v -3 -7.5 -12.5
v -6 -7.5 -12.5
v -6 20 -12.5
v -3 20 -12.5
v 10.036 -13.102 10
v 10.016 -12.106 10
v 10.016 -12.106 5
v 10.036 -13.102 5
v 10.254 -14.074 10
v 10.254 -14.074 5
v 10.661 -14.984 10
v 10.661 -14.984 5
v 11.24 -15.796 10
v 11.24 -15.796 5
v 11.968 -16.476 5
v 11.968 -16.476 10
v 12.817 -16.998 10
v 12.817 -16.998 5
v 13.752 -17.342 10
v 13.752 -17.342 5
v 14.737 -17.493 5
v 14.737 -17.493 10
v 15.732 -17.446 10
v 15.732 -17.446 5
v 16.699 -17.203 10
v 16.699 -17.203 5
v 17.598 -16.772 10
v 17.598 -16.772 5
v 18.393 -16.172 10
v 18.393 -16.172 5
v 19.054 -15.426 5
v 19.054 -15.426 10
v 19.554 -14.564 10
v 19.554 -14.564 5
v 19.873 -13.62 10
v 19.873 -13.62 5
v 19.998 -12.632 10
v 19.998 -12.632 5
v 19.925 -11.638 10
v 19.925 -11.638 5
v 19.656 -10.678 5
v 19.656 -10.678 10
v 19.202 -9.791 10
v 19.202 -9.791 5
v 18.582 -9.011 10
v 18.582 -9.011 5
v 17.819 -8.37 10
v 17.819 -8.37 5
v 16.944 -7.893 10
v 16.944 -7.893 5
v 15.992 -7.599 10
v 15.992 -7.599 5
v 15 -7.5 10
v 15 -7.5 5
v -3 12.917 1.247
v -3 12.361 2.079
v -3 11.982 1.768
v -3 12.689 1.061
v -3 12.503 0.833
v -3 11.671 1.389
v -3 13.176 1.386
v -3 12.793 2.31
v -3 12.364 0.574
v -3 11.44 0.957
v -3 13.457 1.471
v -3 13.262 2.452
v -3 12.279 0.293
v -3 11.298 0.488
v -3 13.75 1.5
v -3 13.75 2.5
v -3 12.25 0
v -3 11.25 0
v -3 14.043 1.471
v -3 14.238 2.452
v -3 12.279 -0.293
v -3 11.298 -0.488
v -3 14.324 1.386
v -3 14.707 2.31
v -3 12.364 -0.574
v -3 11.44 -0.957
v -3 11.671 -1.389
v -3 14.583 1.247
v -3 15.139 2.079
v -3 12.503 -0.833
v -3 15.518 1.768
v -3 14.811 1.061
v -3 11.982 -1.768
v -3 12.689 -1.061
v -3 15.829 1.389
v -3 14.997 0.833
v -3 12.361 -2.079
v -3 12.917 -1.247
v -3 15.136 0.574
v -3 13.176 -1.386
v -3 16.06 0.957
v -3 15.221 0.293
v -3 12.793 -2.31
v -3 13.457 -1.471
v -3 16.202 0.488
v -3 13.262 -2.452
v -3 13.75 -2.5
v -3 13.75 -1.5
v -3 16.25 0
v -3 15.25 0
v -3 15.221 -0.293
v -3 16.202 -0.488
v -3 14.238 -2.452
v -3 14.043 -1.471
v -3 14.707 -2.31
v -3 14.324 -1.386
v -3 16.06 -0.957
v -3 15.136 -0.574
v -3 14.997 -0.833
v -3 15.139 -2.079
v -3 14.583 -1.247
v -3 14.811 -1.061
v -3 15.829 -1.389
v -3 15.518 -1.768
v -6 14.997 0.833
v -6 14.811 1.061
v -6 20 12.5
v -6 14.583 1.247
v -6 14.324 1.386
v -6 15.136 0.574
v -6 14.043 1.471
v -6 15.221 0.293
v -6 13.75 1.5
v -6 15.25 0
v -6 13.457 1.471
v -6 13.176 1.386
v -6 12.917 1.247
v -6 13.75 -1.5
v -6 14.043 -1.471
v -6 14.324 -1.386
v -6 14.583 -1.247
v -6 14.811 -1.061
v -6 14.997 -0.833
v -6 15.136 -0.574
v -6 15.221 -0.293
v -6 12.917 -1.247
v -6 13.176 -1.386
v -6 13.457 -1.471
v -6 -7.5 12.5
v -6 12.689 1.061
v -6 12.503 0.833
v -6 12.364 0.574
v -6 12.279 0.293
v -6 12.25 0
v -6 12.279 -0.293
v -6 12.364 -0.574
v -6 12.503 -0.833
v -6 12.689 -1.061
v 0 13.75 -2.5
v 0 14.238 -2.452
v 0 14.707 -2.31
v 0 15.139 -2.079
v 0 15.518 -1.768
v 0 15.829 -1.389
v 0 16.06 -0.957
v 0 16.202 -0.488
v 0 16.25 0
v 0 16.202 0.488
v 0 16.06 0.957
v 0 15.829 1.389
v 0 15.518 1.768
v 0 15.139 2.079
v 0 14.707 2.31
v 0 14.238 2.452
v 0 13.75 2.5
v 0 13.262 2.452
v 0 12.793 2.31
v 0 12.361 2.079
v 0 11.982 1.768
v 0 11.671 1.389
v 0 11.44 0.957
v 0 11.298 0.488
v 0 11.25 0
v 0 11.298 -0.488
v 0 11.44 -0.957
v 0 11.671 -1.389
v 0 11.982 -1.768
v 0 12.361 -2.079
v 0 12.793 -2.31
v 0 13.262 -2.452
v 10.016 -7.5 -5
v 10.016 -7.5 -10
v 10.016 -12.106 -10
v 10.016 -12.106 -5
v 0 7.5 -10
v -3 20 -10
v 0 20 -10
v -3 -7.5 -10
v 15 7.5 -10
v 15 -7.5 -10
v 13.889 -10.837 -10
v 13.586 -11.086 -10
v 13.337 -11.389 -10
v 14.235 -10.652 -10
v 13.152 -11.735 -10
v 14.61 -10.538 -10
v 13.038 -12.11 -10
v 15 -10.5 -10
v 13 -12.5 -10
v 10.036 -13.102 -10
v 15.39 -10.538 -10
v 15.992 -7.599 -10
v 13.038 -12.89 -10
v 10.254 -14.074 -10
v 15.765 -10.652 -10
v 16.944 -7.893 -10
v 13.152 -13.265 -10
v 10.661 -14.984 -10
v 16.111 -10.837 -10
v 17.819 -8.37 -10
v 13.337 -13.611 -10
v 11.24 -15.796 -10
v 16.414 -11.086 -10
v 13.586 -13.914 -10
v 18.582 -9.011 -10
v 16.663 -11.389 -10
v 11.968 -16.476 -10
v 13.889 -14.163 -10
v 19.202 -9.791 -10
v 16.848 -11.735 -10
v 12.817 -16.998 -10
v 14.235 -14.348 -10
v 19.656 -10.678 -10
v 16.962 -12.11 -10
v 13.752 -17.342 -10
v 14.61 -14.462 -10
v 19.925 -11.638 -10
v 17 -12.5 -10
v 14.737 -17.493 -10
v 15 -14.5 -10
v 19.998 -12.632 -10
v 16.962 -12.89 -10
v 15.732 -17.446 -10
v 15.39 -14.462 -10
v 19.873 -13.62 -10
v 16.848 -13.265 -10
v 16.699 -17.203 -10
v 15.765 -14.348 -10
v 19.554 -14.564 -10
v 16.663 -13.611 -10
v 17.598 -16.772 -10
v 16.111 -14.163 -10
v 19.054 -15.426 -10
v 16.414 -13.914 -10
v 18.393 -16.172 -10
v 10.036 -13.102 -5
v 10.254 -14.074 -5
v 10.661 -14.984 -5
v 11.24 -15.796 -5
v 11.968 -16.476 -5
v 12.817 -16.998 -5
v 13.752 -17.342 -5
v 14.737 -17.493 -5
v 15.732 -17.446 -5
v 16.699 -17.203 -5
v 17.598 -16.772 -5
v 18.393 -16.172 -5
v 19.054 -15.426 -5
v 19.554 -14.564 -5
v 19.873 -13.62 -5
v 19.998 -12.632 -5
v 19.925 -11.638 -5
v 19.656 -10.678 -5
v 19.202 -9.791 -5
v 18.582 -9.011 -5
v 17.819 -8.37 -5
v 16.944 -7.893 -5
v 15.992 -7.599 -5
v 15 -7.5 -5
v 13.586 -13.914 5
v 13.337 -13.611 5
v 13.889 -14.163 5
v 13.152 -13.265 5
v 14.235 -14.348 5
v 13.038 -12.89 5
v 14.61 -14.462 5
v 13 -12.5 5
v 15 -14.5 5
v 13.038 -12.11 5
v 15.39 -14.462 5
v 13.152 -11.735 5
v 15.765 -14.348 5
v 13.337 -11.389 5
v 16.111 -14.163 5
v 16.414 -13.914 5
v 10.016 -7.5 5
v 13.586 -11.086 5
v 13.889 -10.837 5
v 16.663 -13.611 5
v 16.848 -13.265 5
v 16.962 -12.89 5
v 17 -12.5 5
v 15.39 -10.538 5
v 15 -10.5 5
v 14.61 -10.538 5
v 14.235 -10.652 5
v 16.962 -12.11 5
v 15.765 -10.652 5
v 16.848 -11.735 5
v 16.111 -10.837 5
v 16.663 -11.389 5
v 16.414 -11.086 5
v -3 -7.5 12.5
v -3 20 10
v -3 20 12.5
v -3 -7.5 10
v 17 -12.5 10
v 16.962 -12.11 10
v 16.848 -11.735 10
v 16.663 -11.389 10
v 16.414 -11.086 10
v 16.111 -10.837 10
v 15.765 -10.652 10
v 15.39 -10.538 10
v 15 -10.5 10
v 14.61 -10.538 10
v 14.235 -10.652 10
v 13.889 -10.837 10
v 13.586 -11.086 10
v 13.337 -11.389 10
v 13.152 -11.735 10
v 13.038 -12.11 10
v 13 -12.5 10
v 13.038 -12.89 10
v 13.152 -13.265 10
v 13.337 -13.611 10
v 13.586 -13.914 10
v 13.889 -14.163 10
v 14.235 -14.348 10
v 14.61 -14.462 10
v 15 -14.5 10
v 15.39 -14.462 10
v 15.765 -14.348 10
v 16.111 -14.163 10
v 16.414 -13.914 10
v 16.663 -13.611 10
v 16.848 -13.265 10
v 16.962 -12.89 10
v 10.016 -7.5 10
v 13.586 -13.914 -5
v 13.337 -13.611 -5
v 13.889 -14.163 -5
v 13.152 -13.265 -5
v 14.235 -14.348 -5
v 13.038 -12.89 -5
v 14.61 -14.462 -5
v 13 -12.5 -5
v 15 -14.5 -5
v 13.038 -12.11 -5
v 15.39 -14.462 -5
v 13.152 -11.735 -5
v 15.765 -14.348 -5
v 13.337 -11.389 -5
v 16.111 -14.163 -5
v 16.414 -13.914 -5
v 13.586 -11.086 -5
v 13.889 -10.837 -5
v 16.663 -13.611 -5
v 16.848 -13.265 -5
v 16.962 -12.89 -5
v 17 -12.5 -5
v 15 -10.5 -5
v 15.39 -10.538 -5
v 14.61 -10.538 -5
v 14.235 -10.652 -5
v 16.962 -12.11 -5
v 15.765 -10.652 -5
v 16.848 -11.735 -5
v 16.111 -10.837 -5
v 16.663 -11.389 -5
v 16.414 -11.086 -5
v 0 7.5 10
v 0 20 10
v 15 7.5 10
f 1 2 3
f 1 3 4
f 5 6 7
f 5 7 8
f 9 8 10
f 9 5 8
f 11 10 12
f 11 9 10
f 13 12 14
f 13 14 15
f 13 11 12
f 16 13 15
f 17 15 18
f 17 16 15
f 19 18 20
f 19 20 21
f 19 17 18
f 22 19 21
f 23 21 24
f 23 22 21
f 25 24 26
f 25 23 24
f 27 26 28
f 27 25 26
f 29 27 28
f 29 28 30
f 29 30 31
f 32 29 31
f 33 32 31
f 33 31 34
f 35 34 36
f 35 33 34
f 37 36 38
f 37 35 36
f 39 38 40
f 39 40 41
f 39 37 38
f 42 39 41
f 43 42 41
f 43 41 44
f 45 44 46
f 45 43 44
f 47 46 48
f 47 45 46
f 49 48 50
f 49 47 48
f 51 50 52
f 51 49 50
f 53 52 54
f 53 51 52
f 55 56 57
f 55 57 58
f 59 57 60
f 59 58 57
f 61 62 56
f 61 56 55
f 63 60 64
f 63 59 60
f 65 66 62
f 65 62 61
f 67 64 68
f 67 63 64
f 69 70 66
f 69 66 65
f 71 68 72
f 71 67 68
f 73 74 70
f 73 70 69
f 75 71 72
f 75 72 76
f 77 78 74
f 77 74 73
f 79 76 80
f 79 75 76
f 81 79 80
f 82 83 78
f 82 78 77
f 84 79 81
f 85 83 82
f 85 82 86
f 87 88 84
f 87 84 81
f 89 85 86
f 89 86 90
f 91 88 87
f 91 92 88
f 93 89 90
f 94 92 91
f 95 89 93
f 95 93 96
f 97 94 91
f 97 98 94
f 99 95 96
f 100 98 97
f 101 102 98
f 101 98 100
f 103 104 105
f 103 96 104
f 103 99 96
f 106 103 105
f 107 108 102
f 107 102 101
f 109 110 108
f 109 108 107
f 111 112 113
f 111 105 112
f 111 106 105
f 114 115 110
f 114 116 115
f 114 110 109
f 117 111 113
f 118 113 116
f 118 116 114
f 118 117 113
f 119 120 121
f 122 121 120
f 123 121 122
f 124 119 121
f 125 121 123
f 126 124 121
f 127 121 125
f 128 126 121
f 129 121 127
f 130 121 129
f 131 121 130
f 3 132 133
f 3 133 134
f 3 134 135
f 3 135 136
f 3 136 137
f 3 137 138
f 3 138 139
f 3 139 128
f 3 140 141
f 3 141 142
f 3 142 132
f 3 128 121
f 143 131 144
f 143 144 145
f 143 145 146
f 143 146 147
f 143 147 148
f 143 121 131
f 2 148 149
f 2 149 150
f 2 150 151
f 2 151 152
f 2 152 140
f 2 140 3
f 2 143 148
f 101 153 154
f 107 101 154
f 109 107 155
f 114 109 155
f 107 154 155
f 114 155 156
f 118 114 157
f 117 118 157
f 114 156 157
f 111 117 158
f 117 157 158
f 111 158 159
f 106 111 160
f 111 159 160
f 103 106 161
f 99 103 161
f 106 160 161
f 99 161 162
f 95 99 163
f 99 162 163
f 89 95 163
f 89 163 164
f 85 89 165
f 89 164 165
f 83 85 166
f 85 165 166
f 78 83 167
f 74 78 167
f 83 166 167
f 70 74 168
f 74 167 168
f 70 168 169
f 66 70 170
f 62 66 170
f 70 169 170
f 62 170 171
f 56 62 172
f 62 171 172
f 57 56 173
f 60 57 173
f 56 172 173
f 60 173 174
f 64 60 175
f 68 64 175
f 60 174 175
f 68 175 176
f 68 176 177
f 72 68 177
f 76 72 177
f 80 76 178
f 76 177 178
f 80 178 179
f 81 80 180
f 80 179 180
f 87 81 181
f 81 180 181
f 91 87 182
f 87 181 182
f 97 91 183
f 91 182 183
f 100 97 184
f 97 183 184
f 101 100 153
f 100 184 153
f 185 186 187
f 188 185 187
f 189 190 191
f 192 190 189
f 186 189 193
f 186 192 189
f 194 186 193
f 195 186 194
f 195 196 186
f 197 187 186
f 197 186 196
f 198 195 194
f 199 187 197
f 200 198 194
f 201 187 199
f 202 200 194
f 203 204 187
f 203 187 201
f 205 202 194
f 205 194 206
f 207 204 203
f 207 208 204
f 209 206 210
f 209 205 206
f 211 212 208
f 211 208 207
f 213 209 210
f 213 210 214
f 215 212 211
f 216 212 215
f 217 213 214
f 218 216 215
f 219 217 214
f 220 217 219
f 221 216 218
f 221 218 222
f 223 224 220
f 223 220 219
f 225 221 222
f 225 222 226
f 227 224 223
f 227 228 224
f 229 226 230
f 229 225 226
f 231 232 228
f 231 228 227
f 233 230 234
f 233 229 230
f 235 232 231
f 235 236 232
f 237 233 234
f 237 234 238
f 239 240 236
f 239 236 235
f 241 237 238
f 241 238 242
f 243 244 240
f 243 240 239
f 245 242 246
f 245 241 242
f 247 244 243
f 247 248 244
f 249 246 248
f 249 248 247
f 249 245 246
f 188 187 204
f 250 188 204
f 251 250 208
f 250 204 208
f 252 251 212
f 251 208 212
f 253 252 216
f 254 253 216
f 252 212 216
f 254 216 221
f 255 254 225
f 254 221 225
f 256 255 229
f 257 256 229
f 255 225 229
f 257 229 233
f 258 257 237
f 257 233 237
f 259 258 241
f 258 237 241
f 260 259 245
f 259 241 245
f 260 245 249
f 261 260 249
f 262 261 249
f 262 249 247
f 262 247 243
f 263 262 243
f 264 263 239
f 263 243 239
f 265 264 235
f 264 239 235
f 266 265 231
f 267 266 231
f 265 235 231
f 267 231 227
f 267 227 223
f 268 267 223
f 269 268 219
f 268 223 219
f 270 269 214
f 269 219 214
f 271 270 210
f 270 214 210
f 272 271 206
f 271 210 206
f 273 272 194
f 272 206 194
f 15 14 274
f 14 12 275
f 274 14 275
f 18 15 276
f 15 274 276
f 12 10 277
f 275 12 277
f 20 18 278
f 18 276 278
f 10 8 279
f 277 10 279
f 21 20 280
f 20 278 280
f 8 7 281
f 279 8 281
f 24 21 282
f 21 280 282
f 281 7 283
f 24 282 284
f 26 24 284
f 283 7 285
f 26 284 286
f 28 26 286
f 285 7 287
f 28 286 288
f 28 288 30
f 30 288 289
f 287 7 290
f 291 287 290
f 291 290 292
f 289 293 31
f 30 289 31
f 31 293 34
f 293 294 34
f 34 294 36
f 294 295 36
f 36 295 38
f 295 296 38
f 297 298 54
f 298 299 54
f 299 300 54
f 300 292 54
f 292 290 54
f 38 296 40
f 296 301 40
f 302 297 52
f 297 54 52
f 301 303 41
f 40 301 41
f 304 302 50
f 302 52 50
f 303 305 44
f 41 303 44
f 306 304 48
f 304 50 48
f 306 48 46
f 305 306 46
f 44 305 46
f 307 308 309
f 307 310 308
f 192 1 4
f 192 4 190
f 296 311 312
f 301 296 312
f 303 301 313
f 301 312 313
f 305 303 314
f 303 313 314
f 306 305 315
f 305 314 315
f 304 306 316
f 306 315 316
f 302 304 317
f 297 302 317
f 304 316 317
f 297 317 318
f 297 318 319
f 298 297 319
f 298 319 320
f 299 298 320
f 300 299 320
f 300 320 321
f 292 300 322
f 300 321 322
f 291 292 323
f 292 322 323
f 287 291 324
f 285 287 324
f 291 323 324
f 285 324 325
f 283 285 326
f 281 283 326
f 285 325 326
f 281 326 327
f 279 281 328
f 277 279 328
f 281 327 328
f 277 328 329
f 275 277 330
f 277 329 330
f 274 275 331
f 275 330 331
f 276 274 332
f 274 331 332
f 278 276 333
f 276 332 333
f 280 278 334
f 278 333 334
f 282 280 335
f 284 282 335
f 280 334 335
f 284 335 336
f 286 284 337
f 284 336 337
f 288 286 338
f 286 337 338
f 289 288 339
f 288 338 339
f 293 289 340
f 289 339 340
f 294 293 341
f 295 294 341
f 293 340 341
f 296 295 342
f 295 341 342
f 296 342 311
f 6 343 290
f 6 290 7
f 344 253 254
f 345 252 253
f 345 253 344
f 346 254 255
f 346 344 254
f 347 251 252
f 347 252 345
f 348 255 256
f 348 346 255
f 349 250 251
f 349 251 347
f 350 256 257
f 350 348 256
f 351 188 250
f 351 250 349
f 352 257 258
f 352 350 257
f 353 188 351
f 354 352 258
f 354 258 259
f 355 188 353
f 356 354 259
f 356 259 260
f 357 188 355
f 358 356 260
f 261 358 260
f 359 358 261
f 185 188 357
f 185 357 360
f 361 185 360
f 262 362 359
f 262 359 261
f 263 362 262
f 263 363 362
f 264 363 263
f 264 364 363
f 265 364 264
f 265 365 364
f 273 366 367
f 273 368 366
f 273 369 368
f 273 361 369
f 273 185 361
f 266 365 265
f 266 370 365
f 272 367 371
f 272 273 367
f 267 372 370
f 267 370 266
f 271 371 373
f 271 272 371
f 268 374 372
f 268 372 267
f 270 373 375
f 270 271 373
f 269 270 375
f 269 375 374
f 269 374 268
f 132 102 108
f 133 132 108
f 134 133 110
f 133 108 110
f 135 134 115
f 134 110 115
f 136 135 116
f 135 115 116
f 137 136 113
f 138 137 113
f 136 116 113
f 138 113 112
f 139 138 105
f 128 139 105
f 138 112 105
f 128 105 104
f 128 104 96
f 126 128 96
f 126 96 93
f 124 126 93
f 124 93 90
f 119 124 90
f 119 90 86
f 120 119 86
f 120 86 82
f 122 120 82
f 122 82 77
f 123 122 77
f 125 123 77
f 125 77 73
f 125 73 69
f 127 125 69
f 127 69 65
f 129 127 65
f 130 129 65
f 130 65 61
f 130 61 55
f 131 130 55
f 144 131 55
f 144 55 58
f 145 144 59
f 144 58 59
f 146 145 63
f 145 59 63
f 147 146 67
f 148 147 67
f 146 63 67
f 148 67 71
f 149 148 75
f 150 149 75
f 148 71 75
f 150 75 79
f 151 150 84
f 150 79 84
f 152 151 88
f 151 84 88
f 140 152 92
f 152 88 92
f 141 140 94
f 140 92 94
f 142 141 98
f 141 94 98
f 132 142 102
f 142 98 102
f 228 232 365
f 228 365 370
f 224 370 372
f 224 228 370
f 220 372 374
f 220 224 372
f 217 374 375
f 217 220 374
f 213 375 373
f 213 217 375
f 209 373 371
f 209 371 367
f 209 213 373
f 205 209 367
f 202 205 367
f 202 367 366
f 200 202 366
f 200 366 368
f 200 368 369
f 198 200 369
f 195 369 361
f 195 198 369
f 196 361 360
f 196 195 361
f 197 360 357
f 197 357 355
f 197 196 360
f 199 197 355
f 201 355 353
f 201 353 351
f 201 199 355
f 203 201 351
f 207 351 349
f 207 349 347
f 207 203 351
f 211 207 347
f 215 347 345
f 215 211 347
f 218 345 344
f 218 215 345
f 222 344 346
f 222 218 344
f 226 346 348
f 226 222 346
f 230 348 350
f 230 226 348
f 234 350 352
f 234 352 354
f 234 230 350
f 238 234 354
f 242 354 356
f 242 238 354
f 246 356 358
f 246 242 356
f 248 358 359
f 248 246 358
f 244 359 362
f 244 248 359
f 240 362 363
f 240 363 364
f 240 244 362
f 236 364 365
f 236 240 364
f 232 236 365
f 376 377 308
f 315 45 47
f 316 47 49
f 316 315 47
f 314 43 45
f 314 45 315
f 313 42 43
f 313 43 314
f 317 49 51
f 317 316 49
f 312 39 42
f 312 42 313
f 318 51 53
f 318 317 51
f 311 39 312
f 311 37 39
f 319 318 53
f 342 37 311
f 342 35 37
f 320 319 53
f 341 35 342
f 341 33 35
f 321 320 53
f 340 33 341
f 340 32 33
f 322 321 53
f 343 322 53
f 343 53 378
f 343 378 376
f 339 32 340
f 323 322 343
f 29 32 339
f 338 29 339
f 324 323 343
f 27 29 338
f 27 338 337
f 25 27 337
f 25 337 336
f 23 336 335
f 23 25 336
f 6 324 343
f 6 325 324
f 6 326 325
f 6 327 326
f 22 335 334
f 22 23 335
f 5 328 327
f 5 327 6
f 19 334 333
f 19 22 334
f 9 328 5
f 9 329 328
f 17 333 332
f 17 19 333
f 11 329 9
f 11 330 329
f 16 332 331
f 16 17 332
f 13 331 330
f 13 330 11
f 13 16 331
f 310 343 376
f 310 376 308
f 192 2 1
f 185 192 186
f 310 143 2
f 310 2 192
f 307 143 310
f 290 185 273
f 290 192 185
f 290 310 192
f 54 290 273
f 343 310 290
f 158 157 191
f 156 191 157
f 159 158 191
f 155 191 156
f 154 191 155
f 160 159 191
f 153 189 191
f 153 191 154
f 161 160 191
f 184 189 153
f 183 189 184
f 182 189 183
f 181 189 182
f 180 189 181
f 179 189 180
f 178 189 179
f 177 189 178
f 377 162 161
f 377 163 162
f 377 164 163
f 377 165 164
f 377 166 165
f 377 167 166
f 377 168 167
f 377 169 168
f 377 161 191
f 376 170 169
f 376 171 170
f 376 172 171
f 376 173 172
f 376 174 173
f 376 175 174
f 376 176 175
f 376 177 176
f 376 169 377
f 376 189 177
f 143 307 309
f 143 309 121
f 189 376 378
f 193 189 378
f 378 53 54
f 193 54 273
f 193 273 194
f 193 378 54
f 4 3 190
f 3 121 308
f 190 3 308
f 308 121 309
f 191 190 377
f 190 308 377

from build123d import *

# Parameters (mm, degrees)
SKETCH1_W                = 20
SKETCH1_H                = 15
BOSS_EXTRUDE1_DEPTH      = 15
SKETCH2_R                = 2
BOSS_EXTRUDE2_DEPTH      = 5
BOSS_EXTRUDE3_DEPTH      = 15
BOSS_EXTRUDE3_DEPTH_BACK = 12.5
SKETCH4_R                = 1.5
CUT_EXTRUDE1_DEPTH       = 6
SKETCH4_3_R              = 2.5
SKETCH4_3_R_2            = 1.5
CUT_EXTRUDE2_DEPTH       = 3


with BuildPart() as part:
    # Sketch1 → Boss-Extrude1 (new body)
    with BuildSketch(Plane(origin=(0, 0, 0), x_dir=(0, 0, -1), z_dir=(1, 0, 0))):
        Rectangle(SKETCH1_W, SKETCH1_H)
    extrude(amount=BOSS_EXTRUDE1_DEPTH)

    # Sketch2 → Boss-Extrude2 (add)
    with BuildSketch(Plane.XY.offset(10)):
        with BuildLine():
            Line((15, -7.5), (10.015567122, -7.5))
            Line((10.015567122, -7.5), (10.015567122, -12.105755295))
            ThreePointArc((10.015567122, -12.105755295), (18.393285758, -16.172276101), (15, -7.5))
        make_face()
        with Locations((15, -12.5)):
            Circle(SKETCH2_R, mode=Mode.SUBTRACT)
    boss_extrude2 = extrude(amount=-BOSS_EXTRUDE2_DEPTH)

    # Mirror1: Boss-Extrude2 across plane
    add(boss_extrude2.mirror(Plane.XY))

    # Sketch3 → Boss-Extrude3 (add, two sides)
    with BuildSketch(Plane.XZ.offset(-7.5)) as boss_extrude3_sk:
        Polygon((-3, 10), (-3, 12.5), (-6, 12.5), (-6, -12.5), (-3, -12.5), (-3, -10), (0, -10), (0, 10), align=None)
    extrude(amount=BOSS_EXTRUDE3_DEPTH)
    extrude(boss_extrude3_sk.sketch, amount=-BOSS_EXTRUDE3_DEPTH_BACK)

    # Sketch4 → Cut-Extrude1 (cut)
    with BuildSketch(Plane(origin=(0, 0, 0), x_dir=(0, 0, -1), z_dir=(1, 0, 0))):
        with Locations((0, 13.75)):
            Circle(SKETCH4_R)
    extrude(amount=-CUT_EXTRUDE1_DEPTH, mode=Mode.SUBTRACT)

    # Sketch4<3> → Cut-Extrude2 (cut)
    with BuildSketch(Plane(origin=(0, 0, 0), x_dir=(0, 0, -1), z_dir=(1, 0, 0))):
        with Locations((0, 13.75)):
            Circle(SKETCH4_3_R)
        with Locations((0, 13.75)):
            Circle(SKETCH4_3_R_2, mode=Mode.SUBTRACT)
    extrude(amount=-CUT_EXTRUDE2_DEPTH, mode=Mode.SUBTRACT)


solid = part.part
